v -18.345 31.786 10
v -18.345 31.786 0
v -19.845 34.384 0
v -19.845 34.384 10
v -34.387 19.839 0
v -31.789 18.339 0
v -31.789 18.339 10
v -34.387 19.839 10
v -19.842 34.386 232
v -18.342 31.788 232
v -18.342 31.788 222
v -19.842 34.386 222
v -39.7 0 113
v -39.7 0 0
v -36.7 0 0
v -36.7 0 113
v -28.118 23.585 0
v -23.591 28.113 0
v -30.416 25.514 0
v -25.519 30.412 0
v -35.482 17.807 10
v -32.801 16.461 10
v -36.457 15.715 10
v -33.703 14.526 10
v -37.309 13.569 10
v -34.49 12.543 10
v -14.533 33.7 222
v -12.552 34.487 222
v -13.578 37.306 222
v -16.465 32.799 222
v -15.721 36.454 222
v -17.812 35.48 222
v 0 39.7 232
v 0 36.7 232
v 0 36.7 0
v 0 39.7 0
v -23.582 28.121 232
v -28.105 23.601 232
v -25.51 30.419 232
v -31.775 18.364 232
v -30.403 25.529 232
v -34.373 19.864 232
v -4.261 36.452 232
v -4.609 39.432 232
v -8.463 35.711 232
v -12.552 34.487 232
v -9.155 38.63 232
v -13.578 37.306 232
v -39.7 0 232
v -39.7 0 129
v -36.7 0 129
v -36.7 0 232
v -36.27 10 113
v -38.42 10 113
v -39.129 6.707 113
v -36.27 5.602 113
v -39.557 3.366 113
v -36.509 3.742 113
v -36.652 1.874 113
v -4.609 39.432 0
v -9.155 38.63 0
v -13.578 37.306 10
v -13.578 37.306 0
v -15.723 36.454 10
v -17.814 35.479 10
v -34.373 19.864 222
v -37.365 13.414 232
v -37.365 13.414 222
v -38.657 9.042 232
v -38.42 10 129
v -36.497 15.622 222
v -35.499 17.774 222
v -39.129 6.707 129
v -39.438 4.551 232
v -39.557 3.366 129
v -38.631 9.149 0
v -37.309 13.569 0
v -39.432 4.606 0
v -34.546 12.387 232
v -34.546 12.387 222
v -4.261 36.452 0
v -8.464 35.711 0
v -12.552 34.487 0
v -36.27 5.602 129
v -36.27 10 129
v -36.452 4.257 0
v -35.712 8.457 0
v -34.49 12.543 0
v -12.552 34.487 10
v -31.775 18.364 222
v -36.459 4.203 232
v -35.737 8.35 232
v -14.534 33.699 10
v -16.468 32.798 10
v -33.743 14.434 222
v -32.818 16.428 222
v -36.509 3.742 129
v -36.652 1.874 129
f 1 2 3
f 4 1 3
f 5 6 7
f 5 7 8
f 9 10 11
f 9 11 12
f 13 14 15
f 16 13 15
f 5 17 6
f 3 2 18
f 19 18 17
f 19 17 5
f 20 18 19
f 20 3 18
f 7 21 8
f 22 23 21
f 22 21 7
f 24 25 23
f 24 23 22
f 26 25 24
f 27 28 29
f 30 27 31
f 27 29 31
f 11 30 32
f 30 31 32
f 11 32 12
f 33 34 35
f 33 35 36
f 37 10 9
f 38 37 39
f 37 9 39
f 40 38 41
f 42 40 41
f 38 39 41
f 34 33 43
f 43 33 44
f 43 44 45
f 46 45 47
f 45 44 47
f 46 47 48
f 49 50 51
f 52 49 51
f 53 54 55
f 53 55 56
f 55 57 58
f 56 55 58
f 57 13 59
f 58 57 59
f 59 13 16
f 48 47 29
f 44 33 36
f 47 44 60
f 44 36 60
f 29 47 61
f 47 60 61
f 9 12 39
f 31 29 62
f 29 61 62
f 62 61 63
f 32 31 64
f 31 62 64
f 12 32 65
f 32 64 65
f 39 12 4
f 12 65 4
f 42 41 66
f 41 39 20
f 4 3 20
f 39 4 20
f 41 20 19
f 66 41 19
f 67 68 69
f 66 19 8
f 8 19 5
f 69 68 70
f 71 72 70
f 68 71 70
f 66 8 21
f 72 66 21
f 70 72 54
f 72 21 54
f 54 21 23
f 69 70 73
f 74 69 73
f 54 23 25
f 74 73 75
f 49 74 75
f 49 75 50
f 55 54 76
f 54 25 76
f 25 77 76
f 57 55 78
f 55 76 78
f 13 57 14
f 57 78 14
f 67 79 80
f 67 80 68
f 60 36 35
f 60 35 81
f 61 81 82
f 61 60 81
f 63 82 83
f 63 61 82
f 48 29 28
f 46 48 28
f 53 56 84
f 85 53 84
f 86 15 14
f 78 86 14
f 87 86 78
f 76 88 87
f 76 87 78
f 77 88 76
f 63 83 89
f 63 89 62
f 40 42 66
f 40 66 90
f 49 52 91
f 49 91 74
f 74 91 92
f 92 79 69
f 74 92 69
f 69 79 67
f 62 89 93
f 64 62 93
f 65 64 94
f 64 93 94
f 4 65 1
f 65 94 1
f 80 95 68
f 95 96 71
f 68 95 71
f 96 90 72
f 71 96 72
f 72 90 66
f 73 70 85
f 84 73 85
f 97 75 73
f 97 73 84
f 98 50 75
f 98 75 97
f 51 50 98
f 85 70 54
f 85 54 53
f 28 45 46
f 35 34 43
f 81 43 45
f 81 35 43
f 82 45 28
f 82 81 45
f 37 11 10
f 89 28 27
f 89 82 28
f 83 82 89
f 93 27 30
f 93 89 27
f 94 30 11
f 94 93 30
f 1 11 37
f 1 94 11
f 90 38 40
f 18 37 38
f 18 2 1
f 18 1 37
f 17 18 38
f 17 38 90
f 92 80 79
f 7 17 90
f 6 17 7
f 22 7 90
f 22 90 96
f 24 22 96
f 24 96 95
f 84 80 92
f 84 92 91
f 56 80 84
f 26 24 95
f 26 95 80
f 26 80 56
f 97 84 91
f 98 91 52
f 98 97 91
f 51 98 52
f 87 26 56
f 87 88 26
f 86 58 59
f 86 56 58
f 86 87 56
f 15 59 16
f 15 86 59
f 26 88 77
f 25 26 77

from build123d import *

# Parameters (mm, degrees)
PAD_DEPTH       = 232
POCKET_DEPTH    = 10
POCKET001_DEPTH = 10
SKETCH003_W     = 3.95
SKETCH003_H     = 16
POCKET002_DEPTH = 10


with BuildPart() as part:
    # Sketch → Pad (new body)
    with BuildSketch(Plane.XY):
        with BuildLine():
            ThreePointArc((0, 36.7), (-25.9508188695, 25.9508188695), (-36.7, 0))
            Line((-39.7, 0), (-36.7, 0))
            ThreePointArc((0, 39.7), (-28.0721392131, 28.0721392131), (-39.7, 0))
            Line((0, 36.7), (0, 39.7))
        make_face()
    extrude(amount=PAD_DEPTH)

    # Sketch001 (on Face6 of Pad) → Pocket (cut)
    with BuildSketch(Plane.XY.offset(232)):
        with BuildLine():
            Line((-34.546220009, 12.3874405384), (-37.3653275389, 13.4135117665))
            ThreePointArc((-34.3734039674, 19.8635117665), (-36.0140531533, 16.70562706), (-37.3653275389, 13.4135117665))
            Line((-34.3734039674, 19.8635117665), (-31.7753275389, 18.3635116412))
            ThreePointArc((-31.7753275389, 18.3635116412), (-33.2951238734, 15.4377694716), (-34.546220009, 12.3874405384))
        make_face()
        with BuildLine():
            ThreePointArc((-12.5518984396, 34.4868068334), (-15.5057350305, 33.2635262888), (-18.3418983946, 31.7878084064))
            Line((-18.3418983946, 31.7878084064), (-19.8418984396, 34.3858846958))
            ThreePointArc((-13.5779588696, 37.3058846958), (-16.7735898258, 35.9824496714), (-19.8418984396, 34.3858846958))
            Line((-13.5779588696, 37.3058846958), (-12.5518984396, 34.4868068334))
        make_face()
    extrude(amount=-POCKET_DEPTH, mode=Mode.SUBTRACT)

    # Sketch002 (on Face5 of Pad) → Pocket001 (cut)
    with BuildSketch(Plane(origin=(0, 0, 0), x_dir=(1, 0, 0), z_dir=(0, 0, -1))):
        with BuildLine():
            ThreePointArc((-37.3090779514, -13.5691820834), (-35.9850847763, -16.767935879), (-34.3874519885, -19.8391820834))
            Line((-31.789375638, -18.3391820031), (-34.3874519885, -19.8391820834))
            ThreePointArc((-34.49, -12.543121621), (-33.2661613014, -15.5000810407), (-31.789375638, -18.3391820031))
            Line((-34.49, -12.543121621), (-37.3090779514, -13.5691820834))
        make_face()
        with BuildLine():
            Line((-12.5521392601, -34.4867191828), (-13.57819969, -37.3057970452))
            ThreePointArc((-19.8453837991, -34.3838732819), (-16.7755295873, -35.981545368), (-13.57819969, -37.3057970452))
            Line((-18.3453837845, -31.7857970452), (-19.8453837991, -34.3838732819))
            ThreePointArc((-18.3453837845, -31.7857970452), (-15.507674799, -33.2626220002), (-12.5521392601, -34.4867191828))
        make_face()
    extrude(amount=-POCKET001_DEPTH, mode=Mode.SUBTRACT)

    # Sketch003 (on Face14 of Pocket001) → Pocket002 (cut)
    with BuildSketch(Plane.XZ):
        with Locations((-38.245, 121)):
            Rectangle(SKETCH003_W, SKETCH003_H)
    extrude(amount=-POCKET002_DEPTH, mode=Mode.SUBTRACT)


solid = part.part
